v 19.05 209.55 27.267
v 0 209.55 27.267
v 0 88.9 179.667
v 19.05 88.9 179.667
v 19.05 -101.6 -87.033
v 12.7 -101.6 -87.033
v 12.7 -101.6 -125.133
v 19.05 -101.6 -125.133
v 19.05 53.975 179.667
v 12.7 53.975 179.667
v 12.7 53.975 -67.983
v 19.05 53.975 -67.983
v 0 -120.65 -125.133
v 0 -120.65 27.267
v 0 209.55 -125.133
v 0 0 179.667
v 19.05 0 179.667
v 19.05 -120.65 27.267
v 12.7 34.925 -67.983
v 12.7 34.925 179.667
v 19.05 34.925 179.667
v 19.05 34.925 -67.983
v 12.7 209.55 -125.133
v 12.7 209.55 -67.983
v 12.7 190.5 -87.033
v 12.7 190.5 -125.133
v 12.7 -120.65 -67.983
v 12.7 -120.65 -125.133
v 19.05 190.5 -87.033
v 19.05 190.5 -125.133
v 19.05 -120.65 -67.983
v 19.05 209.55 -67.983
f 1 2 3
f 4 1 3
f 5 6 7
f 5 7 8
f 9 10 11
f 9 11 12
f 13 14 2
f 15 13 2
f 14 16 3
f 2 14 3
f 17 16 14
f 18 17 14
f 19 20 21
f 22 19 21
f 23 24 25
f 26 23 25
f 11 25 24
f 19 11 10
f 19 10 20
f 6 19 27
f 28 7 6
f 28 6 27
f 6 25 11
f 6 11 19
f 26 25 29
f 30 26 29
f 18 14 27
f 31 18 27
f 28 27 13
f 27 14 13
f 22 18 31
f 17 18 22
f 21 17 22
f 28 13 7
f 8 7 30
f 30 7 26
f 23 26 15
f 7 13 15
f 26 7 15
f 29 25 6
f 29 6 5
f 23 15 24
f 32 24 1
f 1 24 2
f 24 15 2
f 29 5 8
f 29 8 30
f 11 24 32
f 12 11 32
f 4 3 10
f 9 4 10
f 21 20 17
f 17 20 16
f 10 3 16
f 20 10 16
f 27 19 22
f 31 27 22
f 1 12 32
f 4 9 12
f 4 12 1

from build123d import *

# Parameters (mm, degrees)
F1_DEPTH = 19.05
F2_W     = 6.35
F2_H     = 19.05
F3_DEPTH = 330.2
F4_W     = 6.35
F4_H     = 19.05
F5_DEPTH = 38.1
F6_W     = 6.35
F6_H     = 19.05
F7_DEPTH = 247.65


# Not quite as in the source:
# - a feature names something its author has since deleted; it is built from what else it names


with BuildPart() as f1:
    # F0 (on Right) → F1 (new body)
    with BuildSketch(Plane.YZ):
        Polygon((-120.65, 27.2672971964), (-120.65, -125.1327028036), (209.55, -125.1327028036), (209.55, 27.2672971964), (88.9, 179.6672971964), (0, 179.6672971964), align=None)
    extrude(amount=F1_DEPTH)

    # F2 (on face) → F3 (cut)
    with BuildSketch(Plane.XZ.offset(120.65)):
        with Locations((15.875, -77.5077028036)):
            Rectangle(F2_W, F2_H)
    extrude(amount=-F3_DEPTH, mode=Mode.SUBTRACT)

    # F4 (on face) → F5 (cut)
    with BuildSketch(Plane(origin=(0, 0, -125.1327028036), x_dir=(1, 0, 0), z_dir=(0, 0, -1))):
        with Locations((15.875, 111.125)):
            Rectangle(F4_W, F4_H)
        with Locations((15.875, -200.025)):
            Rectangle(F4_W, F4_H)
    extrude(amount=-F5_DEPTH, mode=Mode.SUBTRACT)

    # F6 (on face) → F7 (cut)
    with BuildSketch(Plane.XY.offset(179.6672971964)):
        with Locations((15.875, 44.45)):
            Rectangle(F6_W, F6_H)
    extrude(amount=-F7_DEPTH, mode=Mode.SUBTRACT)


solid = f1.part
